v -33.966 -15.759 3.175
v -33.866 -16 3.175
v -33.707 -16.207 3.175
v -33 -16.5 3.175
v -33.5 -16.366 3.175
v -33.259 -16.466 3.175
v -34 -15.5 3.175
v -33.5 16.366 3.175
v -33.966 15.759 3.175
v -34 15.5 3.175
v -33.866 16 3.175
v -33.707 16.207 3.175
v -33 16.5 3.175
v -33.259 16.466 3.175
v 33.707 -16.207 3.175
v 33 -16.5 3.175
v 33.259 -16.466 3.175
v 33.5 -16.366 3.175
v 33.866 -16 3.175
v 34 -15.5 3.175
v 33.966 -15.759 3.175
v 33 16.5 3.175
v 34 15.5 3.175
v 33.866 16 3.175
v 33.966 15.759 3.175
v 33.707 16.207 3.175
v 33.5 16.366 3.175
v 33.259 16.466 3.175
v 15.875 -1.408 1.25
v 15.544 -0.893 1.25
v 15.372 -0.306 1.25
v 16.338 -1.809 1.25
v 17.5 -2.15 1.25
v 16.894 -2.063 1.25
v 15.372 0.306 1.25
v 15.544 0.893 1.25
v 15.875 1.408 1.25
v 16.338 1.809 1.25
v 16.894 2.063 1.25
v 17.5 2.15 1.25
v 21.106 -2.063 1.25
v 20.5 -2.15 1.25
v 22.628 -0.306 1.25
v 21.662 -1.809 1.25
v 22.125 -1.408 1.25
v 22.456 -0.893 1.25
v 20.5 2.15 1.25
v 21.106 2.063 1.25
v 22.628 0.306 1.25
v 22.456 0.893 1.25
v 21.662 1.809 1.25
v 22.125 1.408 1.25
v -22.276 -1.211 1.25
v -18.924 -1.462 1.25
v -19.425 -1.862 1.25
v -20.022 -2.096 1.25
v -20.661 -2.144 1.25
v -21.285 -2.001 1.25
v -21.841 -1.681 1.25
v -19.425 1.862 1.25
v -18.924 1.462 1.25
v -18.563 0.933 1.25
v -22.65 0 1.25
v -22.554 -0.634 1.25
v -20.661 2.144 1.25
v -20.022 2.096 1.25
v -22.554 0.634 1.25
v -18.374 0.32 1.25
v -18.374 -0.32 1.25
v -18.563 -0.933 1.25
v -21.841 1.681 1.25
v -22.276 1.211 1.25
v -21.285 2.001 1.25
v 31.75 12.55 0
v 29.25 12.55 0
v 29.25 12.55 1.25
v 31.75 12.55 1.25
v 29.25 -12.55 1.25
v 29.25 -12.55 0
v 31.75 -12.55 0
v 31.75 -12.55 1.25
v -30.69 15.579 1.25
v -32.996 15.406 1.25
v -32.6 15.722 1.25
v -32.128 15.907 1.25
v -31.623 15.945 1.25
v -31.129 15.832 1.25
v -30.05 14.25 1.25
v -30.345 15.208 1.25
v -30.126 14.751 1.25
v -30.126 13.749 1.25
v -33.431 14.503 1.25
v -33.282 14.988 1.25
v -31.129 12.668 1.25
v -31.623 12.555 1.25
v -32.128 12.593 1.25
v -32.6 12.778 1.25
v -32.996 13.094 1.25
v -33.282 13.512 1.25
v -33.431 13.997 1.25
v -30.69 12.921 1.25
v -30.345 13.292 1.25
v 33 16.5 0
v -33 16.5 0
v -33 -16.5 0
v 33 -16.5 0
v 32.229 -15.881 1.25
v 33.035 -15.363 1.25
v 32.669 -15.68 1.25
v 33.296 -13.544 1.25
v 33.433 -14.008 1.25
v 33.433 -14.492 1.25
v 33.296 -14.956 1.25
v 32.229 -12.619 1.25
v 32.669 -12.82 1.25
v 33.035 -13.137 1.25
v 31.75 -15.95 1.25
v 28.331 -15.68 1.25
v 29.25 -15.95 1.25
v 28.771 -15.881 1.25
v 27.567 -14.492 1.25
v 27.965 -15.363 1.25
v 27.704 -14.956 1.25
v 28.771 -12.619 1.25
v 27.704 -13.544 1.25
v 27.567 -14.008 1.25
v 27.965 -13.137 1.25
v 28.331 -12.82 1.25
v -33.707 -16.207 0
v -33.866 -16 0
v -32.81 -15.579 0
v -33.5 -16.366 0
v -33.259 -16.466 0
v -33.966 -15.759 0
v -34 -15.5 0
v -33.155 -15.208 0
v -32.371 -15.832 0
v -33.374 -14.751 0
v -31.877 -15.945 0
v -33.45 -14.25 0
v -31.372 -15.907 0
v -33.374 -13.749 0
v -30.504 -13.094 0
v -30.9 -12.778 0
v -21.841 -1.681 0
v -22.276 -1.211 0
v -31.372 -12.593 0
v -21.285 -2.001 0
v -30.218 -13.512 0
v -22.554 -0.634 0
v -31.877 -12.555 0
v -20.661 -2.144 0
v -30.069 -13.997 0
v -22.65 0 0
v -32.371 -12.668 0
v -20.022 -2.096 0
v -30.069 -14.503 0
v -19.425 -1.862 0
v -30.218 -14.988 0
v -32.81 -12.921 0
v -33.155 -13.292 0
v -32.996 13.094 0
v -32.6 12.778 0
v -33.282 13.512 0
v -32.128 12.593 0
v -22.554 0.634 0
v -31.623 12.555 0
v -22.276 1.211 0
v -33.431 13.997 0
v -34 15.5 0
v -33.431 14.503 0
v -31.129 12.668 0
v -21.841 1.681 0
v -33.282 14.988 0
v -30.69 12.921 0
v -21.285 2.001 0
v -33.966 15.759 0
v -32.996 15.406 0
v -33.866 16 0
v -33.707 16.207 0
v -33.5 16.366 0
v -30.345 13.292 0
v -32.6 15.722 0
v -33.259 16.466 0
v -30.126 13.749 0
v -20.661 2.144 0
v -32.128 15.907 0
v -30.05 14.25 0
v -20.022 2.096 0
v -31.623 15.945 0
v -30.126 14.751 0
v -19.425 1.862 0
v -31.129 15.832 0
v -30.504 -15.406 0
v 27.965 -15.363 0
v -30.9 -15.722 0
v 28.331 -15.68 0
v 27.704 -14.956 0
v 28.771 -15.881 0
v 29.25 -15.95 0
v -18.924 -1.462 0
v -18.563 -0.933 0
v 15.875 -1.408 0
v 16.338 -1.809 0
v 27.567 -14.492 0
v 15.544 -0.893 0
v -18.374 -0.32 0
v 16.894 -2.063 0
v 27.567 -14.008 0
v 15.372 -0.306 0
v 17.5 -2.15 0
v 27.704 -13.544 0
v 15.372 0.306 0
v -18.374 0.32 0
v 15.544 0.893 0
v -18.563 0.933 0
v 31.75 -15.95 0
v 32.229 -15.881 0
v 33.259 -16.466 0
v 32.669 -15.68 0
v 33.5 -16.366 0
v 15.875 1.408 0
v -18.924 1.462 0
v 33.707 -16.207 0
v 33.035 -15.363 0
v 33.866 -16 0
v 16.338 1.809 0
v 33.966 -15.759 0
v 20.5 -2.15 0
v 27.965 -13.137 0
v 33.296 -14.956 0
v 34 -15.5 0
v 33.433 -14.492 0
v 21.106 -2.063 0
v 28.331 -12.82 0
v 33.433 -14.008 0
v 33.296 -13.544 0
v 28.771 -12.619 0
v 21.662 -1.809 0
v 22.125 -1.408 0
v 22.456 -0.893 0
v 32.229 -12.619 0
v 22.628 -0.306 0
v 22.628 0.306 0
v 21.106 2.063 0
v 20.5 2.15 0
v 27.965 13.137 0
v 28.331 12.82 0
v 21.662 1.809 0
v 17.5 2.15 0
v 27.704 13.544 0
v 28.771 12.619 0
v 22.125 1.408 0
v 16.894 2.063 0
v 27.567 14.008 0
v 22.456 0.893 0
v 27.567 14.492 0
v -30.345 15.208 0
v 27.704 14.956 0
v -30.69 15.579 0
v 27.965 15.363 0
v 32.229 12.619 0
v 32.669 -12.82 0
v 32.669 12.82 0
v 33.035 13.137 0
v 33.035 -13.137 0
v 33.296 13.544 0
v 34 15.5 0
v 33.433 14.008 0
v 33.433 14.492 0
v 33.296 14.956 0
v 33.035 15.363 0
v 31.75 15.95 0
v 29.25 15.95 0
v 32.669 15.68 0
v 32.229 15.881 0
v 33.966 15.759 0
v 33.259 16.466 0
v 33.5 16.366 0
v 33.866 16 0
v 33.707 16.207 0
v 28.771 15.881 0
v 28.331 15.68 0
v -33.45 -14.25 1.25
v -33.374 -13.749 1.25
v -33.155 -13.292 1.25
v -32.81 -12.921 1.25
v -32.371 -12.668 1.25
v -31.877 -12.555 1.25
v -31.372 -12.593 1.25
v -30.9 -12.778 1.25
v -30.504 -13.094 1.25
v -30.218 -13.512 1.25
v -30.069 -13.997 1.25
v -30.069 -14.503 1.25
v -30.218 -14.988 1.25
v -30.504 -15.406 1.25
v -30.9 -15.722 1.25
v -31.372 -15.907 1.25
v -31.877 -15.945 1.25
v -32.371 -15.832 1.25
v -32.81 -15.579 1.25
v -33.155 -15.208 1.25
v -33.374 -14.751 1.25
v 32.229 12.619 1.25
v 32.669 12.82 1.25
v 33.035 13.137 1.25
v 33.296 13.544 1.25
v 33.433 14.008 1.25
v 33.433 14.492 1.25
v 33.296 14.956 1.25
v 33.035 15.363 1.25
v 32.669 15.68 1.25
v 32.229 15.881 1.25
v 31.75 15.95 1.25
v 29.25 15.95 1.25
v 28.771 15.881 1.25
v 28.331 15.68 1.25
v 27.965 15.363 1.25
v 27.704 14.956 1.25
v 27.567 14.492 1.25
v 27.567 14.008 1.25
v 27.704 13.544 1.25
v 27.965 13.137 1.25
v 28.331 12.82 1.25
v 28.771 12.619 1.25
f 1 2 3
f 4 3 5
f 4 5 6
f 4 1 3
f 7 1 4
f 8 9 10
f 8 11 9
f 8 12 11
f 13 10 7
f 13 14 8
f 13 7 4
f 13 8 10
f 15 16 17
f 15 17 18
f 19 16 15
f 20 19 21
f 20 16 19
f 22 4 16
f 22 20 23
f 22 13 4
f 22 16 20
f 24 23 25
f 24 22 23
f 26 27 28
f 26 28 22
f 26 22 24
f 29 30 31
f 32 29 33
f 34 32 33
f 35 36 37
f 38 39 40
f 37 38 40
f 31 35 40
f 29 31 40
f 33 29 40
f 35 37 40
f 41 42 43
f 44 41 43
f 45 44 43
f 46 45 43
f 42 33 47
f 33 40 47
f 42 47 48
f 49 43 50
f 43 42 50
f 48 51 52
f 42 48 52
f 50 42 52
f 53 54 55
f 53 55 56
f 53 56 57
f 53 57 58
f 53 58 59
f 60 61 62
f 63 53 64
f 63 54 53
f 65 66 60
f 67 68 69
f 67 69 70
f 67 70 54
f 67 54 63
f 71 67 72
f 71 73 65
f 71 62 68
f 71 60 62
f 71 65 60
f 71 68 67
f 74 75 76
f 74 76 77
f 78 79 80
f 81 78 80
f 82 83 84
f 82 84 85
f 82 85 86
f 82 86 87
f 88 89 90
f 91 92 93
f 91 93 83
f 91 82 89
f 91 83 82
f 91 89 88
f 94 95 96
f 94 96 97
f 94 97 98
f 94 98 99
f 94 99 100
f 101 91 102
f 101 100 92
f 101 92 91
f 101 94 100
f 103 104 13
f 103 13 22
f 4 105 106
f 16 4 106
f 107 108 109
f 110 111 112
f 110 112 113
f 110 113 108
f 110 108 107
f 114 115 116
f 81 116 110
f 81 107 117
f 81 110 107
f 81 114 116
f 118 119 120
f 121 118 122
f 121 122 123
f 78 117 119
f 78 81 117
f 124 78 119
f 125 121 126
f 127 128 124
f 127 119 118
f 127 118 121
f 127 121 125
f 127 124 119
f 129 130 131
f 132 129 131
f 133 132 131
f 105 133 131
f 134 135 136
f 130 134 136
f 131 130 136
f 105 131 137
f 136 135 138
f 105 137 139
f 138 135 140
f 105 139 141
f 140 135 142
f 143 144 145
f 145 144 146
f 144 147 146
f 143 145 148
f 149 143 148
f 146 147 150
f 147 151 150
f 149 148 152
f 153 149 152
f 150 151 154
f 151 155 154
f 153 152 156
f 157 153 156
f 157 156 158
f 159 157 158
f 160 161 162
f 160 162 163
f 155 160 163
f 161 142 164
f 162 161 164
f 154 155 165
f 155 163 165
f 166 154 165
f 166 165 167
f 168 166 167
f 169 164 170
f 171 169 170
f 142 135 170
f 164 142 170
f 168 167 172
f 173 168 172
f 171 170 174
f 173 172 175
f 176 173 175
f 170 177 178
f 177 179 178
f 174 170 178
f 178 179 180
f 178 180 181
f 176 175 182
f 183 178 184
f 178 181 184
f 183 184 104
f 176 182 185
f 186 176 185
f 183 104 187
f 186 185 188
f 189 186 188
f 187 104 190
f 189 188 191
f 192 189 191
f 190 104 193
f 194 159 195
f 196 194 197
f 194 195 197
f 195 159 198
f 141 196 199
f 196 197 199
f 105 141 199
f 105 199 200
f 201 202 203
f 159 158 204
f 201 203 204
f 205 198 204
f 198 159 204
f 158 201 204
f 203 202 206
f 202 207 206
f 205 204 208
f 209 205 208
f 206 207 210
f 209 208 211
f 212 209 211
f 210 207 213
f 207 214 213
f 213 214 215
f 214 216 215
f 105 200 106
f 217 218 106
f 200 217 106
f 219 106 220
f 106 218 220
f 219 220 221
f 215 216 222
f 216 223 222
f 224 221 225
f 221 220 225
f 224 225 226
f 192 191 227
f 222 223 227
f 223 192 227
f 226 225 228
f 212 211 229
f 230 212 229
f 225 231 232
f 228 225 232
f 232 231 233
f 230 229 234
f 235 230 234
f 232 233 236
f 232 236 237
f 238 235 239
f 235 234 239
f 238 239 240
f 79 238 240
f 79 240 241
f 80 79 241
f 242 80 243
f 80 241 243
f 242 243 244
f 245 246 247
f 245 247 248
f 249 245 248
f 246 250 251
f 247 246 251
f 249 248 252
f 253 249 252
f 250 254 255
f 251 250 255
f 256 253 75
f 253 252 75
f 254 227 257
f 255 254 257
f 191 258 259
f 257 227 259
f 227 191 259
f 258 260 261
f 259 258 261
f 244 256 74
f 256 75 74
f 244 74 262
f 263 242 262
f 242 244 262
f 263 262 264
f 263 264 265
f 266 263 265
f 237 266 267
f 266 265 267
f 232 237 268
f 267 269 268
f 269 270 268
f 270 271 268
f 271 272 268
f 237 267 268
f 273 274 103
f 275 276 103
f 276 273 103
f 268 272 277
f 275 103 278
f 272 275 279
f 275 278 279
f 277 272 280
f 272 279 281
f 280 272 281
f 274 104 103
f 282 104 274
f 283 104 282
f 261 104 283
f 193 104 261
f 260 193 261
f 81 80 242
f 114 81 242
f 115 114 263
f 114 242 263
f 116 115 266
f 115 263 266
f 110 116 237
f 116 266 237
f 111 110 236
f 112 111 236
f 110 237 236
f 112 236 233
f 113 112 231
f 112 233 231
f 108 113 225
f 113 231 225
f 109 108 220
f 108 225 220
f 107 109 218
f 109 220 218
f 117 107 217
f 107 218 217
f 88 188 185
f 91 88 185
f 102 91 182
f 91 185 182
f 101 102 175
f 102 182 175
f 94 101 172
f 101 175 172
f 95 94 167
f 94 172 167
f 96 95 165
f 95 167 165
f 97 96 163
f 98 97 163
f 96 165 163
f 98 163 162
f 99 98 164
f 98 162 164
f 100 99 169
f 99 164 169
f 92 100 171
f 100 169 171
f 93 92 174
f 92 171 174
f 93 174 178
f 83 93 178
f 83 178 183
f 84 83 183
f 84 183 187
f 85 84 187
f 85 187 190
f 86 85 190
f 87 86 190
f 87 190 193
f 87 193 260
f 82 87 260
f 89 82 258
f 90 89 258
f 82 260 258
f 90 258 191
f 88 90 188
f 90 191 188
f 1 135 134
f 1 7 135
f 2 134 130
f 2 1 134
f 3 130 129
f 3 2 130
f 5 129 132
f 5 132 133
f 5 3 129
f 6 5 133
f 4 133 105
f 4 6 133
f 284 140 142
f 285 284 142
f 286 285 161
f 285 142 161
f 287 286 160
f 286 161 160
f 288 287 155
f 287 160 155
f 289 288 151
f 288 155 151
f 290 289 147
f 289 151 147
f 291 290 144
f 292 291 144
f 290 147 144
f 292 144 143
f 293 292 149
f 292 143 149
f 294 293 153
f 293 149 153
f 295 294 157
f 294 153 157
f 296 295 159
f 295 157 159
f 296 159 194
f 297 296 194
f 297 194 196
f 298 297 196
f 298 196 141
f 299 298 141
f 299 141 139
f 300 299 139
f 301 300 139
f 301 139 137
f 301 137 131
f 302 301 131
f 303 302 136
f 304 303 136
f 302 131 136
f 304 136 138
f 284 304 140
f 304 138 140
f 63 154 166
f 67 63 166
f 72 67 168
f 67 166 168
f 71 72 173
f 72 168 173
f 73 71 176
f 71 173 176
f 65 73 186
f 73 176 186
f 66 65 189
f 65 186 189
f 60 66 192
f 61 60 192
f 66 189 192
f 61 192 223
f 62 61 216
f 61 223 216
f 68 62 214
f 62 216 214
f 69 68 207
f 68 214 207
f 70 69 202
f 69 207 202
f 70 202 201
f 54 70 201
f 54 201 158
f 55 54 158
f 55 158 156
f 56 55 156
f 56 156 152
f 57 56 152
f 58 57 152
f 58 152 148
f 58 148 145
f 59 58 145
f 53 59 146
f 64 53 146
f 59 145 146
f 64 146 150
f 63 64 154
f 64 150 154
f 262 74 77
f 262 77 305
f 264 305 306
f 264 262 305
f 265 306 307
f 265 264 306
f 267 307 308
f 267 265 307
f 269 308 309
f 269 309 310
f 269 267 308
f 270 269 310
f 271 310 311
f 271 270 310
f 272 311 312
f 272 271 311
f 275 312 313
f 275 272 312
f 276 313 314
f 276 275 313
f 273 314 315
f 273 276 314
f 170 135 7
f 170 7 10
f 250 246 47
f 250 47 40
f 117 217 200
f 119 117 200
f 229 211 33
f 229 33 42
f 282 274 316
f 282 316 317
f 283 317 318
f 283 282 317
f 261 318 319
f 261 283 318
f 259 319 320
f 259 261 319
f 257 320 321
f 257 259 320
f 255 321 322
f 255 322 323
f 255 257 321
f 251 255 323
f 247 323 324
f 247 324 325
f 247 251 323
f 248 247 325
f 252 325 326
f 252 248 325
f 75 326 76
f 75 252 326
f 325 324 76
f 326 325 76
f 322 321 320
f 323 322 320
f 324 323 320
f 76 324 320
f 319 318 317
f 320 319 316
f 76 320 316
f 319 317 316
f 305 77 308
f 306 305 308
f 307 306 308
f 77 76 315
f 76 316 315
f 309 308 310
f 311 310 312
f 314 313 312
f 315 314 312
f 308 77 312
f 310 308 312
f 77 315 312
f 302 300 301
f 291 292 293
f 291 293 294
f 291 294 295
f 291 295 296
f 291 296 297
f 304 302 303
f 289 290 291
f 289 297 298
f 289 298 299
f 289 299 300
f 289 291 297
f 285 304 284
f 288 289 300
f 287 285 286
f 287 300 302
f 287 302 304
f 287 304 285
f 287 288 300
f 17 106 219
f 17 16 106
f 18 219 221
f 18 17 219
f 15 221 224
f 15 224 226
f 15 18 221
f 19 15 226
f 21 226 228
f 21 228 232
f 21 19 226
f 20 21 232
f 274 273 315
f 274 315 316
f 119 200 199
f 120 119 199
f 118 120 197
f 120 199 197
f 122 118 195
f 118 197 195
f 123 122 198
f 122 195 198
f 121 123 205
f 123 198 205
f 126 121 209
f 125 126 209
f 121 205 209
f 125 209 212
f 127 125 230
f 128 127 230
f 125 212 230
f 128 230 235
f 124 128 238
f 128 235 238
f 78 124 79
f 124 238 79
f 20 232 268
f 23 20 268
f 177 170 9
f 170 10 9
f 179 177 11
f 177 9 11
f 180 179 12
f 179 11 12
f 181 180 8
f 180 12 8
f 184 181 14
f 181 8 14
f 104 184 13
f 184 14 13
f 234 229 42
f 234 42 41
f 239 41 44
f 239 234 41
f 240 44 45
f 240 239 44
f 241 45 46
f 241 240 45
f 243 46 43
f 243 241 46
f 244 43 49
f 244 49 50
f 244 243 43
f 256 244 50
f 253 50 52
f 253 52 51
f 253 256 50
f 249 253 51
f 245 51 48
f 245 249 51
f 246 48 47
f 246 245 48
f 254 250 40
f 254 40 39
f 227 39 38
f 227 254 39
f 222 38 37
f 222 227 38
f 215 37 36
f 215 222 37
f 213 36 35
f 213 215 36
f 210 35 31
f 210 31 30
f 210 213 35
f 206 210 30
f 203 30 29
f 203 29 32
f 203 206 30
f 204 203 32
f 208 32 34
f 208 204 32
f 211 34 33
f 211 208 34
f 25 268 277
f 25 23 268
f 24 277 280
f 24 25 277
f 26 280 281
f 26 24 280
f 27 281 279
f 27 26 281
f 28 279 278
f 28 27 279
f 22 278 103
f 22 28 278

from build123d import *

# Parameters (mm, degrees)
SKETCH1_W           = 68
SKETCH1_H           = 33
BOSS_EXTRUDE1_DEPTH = 3.175
FILLET1_R           = 1
SKETCH2_R           = 2.15
SKETCH2_R_2         = 1.7
CUT_EXTRUDE2_DEPTH  = 1.25


with BuildPart() as part:
    # Sketch1 → Boss-Extrude1 (new body)
    with BuildSketch(Plane.XY):
        Rectangle(SKETCH1_W, SKETCH1_H)
    extrude(amount=BOSS_EXTRUDE1_DEPTH)

    # Fillet1
    fillet1_edges = [part.edges().sort_by_distance(p)[0] for p in [
        (34, 16.5, 1.5875),
        (34, -16.5, 1.5875),
        (-34, -16.5, 1.5875),
        (-34, 16.5, 1.5875),
    ]]
    fillet(fillet1_edges, radius=FILLET1_R)

    # Sketch2 → Cut-Extrude2 (cut)
    with BuildSketch(Plane(origin=(0, 0, 0), x_dir=(-1, 0, 0), z_dir=(0, 0, -1))):
        with Locations((20.5, 0)):
            Circle(SKETCH2_R)
        with Locations((31.75, -14.25)):
            Circle(SKETCH2_R_2)
        with Locations(Location((31.75, 14.25, 0), (0, 0, 180))):
            Circle(SKETCH2_R_2)
        with BuildLine():
            Line((-31.75, 15.95), (-29.25, 15.95))
            ThreePointArc((-29.25, 15.95), (-27.55, 14.25), (-29.25, 12.55))
            Line((-29.25, 12.55), (-31.75, 12.55))
            ThreePointArc((-31.75, 12.55), (-33.45, 14.25), (-31.75, 15.95))
        make_face()
        with BuildLine():
            Line((-31.75, -15.95), (-29.25, -15.95))
            ThreePointArc((-29.25, -15.95), (-27.55, -14.25), (-29.25, -12.55))
            Line((-29.25, -12.55), (-31.75, -12.55))
            ThreePointArc((-31.75, -12.55), (-33.45, -14.25), (-31.75, -15.95))
        make_face()
        with BuildLine():
            Line((-20.5, 2.15), (-17.5, 2.15))
            ThreePointArc((-17.5, 2.15), (-15.35, 0), (-17.5, -2.15))
            Line((-17.5, -2.15), (-20.5, -2.15))
            ThreePointArc((-20.5, -2.15), (-22.65, 0), (-20.5, 2.15))
        make_face()
    extrude(amount=-CUT_EXTRUDE2_DEPTH, mode=Mode.SUBTRACT)


solid = part.part
